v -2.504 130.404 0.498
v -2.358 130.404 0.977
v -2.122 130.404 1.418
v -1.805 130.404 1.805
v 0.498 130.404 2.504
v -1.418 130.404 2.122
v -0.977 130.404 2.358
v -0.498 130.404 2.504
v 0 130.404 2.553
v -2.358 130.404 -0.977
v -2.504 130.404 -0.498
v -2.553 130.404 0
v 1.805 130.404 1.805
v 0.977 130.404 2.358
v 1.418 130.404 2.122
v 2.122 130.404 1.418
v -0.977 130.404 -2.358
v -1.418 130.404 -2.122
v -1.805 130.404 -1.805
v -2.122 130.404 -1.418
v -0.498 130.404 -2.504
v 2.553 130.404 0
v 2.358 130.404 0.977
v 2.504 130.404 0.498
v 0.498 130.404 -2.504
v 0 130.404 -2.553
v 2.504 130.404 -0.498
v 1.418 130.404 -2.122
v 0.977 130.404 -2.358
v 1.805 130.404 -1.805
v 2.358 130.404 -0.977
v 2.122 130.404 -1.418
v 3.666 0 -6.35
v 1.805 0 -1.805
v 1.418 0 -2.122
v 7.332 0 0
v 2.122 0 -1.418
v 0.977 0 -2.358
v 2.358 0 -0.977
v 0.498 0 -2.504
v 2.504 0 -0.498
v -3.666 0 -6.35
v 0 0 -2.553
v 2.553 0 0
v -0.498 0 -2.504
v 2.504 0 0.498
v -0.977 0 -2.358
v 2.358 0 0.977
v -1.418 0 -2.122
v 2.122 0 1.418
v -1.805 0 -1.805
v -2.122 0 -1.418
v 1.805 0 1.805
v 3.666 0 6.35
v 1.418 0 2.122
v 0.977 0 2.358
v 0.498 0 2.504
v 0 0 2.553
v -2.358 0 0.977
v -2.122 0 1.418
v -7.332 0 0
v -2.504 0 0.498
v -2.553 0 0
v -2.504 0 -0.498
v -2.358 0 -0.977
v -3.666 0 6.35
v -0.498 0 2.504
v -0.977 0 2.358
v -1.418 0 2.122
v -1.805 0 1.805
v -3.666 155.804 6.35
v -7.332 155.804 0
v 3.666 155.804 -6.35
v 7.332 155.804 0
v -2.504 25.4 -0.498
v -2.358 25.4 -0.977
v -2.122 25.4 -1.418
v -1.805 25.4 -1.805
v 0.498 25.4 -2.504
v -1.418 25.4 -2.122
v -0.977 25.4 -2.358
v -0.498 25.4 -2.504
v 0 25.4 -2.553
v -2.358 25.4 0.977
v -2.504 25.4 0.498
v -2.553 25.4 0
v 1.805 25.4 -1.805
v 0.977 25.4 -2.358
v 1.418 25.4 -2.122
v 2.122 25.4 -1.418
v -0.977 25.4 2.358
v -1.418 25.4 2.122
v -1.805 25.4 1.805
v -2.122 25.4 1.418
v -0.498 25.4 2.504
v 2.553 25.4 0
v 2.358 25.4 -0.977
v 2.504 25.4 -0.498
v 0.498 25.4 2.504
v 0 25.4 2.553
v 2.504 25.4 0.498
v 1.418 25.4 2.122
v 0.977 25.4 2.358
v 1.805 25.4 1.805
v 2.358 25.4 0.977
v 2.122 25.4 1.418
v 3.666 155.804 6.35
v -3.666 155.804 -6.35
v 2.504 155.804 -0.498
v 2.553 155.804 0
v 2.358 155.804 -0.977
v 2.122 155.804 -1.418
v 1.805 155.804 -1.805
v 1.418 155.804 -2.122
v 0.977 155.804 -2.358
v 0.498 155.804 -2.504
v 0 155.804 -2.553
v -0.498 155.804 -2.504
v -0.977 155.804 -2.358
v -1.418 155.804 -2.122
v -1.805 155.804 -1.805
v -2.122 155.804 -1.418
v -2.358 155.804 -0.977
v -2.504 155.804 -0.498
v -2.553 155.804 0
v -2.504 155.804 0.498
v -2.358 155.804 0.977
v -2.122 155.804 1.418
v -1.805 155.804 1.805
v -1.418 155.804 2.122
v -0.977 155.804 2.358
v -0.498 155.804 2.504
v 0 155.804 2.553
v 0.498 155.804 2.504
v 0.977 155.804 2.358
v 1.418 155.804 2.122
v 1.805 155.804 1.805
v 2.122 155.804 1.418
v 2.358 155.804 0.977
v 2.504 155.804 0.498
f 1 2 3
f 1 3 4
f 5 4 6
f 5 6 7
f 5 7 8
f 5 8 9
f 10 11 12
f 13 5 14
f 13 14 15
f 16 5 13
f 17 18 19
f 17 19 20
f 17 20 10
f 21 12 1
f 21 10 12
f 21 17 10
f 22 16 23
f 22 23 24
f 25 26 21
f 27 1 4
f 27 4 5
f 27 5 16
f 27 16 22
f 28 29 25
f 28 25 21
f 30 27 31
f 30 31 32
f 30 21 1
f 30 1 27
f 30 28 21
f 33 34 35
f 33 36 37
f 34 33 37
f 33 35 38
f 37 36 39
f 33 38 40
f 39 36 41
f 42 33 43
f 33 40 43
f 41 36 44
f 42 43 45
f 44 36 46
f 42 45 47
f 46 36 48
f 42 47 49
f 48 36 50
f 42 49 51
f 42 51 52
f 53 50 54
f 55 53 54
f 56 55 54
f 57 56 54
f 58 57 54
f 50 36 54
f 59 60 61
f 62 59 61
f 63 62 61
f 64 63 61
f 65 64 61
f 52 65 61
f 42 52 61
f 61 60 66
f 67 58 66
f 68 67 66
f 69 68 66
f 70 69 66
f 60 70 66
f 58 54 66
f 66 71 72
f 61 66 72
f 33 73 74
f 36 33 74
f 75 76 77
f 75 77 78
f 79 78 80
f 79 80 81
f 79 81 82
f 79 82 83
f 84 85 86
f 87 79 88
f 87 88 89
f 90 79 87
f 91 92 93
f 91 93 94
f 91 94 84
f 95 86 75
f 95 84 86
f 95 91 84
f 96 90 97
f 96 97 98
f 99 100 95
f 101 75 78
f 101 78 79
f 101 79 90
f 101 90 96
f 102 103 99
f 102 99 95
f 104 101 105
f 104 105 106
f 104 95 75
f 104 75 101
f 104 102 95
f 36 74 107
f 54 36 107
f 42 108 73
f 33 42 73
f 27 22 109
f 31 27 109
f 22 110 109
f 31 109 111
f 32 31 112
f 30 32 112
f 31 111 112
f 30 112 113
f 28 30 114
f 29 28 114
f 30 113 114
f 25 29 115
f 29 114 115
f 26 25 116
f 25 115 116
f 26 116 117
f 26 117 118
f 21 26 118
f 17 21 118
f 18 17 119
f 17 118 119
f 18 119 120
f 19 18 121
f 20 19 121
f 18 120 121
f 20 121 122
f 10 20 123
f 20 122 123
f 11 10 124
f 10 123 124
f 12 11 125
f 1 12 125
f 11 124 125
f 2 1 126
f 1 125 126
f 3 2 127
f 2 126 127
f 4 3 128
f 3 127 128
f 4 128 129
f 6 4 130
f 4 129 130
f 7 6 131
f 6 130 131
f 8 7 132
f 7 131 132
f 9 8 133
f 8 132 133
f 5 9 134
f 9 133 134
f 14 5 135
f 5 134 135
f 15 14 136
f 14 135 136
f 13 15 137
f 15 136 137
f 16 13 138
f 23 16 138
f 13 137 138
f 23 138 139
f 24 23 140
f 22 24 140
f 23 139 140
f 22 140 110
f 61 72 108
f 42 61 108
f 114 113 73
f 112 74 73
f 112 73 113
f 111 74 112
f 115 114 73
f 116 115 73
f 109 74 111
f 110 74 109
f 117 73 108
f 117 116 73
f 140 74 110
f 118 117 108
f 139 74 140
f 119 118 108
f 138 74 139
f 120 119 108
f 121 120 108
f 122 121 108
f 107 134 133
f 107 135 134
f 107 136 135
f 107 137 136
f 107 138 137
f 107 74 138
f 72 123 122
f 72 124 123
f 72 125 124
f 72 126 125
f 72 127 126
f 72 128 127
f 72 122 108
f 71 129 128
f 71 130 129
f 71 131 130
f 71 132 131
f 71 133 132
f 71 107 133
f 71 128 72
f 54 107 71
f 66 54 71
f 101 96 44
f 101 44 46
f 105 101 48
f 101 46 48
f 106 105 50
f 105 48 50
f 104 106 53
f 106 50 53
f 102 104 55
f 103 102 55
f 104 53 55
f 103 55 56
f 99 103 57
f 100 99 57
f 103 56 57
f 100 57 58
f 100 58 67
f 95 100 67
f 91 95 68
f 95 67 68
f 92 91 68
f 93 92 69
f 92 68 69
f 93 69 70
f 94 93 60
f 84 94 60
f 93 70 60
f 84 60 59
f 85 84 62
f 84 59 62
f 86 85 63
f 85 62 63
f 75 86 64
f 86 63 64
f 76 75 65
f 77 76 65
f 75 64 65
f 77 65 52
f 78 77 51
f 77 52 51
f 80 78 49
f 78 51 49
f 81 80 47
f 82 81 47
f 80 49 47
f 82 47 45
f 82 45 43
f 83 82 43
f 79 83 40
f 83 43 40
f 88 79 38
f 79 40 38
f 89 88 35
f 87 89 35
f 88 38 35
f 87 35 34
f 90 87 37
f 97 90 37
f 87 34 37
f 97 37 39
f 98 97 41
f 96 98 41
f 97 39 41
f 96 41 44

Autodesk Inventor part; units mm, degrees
ref_plane "YZ Plane" through (0, 0, 0) normal (1, 0, 0) x (0, 1, 0)
ref_plane "XZ Plane" through (0, 0, 0) normal (0, 1, 0) x (-1, 0, 0)
ref_plane "XY Plane" through (0, 0, 0) normal (0, 0, 1) x (1, 0, 0)
sketch "Sketch1" plane through (0, 0, 0) normal (0, 1, 0) x (-1, 0, 0)
  line L0 (-7.3323, 0) -> (-3.6662, 6.35)
  line L1 (-3.6662, 6.35) -> (3.6662, 6.35)
  line L2 (3.6662, 6.35) -> (7.3323, 0)
  line L3 (7.3323, 0) -> (3.6662, -6.35)
  line L4 (3.6662, -6.35) -> (-3.6662, -6.35)
  line L5 (-3.6662, -6.35) -> (-7.3323, 0)
  point P0 (0, 0)
  point P1 (0, 0)
  dimension "d0" = 12.7
extrude "Extrusion1" add sketch "Sketch1" along normal blind 155.8036
sketch "Sketch2" plane through (0, 155.8036, 0) normal (0, 1, 0) x (1, 0, 0)
  circle A0 centre (0, 0) radius 2.5527
  dimension "d3" = 5.1054
sketch "Sketch3" plane through (0, 0, 0) normal (0, -1, 0) x (1, 0, 0)
  circle A0 centre (0, 0) radius 2.5527
  dimension "d4" = 5.1054
extrude "Extrusion2" cut sketch "Sketch3" against normal blind 25.4
extrude "Extrusion3" cut sketch "Sketch2" against normal blind 25.4
properties part number "INDX_016_BottomHex" material "Aluminum 6061"
